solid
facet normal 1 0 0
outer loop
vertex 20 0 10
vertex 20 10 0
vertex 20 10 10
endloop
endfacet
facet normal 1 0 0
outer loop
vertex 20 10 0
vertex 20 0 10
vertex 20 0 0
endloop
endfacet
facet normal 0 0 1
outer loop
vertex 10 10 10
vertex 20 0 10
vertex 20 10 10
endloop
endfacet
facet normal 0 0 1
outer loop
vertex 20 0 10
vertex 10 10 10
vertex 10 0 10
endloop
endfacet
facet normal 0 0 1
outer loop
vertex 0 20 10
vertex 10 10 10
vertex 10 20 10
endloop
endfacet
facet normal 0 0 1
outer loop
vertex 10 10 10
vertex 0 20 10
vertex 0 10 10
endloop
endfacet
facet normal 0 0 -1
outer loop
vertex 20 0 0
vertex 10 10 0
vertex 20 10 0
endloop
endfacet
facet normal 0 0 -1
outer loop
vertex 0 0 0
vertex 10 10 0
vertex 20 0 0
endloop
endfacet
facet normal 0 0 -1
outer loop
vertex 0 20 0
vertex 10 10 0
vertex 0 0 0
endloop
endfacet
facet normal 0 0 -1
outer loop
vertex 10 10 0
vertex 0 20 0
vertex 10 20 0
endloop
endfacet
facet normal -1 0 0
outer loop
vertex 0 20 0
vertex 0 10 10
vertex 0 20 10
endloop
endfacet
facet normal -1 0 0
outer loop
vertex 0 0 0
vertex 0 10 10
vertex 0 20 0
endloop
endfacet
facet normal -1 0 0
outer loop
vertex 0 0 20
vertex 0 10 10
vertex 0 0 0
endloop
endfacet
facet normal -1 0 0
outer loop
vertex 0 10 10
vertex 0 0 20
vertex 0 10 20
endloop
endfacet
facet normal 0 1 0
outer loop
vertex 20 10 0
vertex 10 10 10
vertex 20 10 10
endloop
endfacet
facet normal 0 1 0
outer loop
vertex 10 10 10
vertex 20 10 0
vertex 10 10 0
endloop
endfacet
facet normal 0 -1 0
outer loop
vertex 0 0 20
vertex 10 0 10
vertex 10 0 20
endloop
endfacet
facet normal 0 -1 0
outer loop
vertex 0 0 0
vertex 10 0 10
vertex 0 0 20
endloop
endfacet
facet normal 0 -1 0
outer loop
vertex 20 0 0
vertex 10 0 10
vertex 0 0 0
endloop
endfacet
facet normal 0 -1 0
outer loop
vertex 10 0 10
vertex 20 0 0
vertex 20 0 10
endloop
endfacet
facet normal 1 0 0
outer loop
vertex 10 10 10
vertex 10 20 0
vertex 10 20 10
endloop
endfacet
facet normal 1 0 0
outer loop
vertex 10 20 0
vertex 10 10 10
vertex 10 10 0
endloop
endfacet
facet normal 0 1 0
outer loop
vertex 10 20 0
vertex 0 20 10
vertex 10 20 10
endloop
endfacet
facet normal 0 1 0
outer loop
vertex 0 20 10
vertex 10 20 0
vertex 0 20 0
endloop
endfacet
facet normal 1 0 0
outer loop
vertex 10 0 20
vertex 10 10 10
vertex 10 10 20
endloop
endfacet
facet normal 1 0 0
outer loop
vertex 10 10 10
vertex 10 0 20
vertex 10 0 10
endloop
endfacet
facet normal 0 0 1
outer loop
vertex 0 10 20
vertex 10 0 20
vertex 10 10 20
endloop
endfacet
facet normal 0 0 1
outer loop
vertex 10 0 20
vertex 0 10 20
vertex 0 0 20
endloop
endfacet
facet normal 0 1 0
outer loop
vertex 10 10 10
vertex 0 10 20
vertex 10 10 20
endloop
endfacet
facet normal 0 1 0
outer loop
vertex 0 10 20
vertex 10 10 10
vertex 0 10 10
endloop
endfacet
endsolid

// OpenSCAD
union(){
    cube(size=[20, 10, 10]);
    cube(size=[10, 20, 10]);
    cube(size=[10, 10, 20]);
};
